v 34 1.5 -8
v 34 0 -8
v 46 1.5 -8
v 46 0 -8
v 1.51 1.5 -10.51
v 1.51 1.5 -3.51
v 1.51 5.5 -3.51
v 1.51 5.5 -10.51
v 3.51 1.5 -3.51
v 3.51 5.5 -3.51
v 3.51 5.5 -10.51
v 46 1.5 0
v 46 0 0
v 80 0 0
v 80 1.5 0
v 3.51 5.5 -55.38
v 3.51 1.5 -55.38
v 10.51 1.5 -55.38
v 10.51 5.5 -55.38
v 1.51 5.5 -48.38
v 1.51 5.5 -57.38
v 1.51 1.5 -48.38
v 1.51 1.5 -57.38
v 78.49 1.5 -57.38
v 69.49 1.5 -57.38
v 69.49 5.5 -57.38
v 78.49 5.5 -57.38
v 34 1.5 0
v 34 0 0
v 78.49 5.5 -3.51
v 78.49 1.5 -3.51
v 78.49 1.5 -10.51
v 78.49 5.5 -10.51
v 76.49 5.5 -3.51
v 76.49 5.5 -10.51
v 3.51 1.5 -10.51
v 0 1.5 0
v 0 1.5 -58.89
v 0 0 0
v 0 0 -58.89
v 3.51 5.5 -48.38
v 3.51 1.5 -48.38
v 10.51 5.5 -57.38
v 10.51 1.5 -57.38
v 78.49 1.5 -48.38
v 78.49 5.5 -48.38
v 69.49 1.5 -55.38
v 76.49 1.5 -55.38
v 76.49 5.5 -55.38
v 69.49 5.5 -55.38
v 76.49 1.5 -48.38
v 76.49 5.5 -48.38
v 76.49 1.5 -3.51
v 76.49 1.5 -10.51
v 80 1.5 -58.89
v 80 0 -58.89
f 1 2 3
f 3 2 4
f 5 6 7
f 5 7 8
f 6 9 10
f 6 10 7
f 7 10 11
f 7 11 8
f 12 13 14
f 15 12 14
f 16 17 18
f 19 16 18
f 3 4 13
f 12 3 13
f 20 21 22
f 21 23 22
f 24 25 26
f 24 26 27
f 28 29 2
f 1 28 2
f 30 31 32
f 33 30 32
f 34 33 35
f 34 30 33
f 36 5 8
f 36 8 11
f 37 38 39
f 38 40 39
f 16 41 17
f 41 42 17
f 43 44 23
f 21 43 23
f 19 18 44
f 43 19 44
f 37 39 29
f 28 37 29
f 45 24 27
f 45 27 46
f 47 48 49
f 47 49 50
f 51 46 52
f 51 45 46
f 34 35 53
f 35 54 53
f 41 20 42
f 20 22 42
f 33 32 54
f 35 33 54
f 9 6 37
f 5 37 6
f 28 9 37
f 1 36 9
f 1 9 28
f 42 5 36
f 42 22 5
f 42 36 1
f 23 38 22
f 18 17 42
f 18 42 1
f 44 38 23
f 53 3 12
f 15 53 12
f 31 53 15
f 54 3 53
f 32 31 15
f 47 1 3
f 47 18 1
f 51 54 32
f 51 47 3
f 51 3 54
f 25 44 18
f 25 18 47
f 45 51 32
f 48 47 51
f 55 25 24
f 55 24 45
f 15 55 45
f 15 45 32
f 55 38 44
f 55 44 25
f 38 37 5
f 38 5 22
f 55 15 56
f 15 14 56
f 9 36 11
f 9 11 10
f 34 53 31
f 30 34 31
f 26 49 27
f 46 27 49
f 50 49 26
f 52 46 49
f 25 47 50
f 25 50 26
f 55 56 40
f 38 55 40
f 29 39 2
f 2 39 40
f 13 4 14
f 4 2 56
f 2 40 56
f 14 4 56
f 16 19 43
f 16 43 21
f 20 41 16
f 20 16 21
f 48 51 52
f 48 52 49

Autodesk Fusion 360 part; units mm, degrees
sketch "Sketch1" plane through (0, 0, 0) normal (0, 1, 0) x (1, 0, 0)
  line L0 (0, 0) -> (80, 0)
  line L1 (80, 0) -> (80, 58.89)
  line L2 (80, 58.89) -> (0, 58.89)
  line L3 (0, 58.89) -> (0, 0)
  line L4 (46, 0) -> (34, 0)
  line L5 (34, 0) -> (34, 8)
  line L6 (34, 8) -> (46, 8)
  line L7 (46, 8) -> (46, 0)
  dimension "d1" = 58.89
  dimension "d2" = 80
  dimension "d11" = 8
  dimension "d14" = 12
  dimension "d15" = 34
extrude "Extrude1" add sketch "Sketch1" along normal blind 1.5
sketch "Sketch2" plane through (0, 1.5, 0) normal (0, 1, 0) x (-1, 0, 0)
  line L0 (0, -58.89) -> (0, 0)
  line L1 (0, 0) -> (-80, 0)
  line L2 (-80, 0) -> (-80, -58.89)
  line L3 (-80, -58.89) -> (0, -58.89)
  line L4 (-10.51, -1.51) -> (-1.51, -1.51)
  line L5 (-1.51, -1.51) -> (-1.51, -10.51)
  line L6 (-1.51, -10.51) -> (-10.51, -10.51)
  line L7 (-10.51, -10.51) -> (-10.51, -1.51)
  line L8 (-10.51, -10.51) -> (-3.51, -10.51)
  line L9 (-3.51, -10.51) -> (-3.51, -3.51)
  line L10 (-3.51, -3.51) -> (-10.51, -3.51)
  line L11 (-10.51, -3.51) -> (-10.51, -10.51)
  line L12 (0, -29.445) -> (-80, -29.445) construction
  line L13 (-3.51, -48.38) -> (-3.51, -55.38)
  line L14 (-3.51, -55.38) -> (-10.51, -55.38)
  line L15 (-10.51, -48.38) -> (-10.51, -57.38)
  line L16 (-1.51, -48.38) -> (-10.51, -48.38)
  line L17 (-1.51, -57.38) -> (-1.51, -48.38)
  line L18 (-10.51, -57.38) -> (-1.51, -57.38)
  line L19 (-69.49, -1.51) -> (-78.49, -1.51)
  line L20 (-76.49, -3.51) -> (-69.49, -3.51)
  line L21 (-78.49, -1.51) -> (-78.49, -10.51)
  line L22 (-76.49, -10.51) -> (-76.49, -3.51)
  line L23 (-78.49, -10.51) -> (-69.49, -10.51)
  line L24 (-69.49, -10.51) -> (-69.49, -1.51)
  line L25 (-78.49, -48.38) -> (-69.49, -48.38)
  line L26 (-69.49, -48.38) -> (-69.49, -57.38)
  line L27 (-76.49, -48.38) -> (-76.49, -55.38)
  line L28 (-78.49, -57.38) -> (-78.49, -48.38)
  line L29 (-76.49, -55.38) -> (-69.49, -55.38)
  line L30 (-69.49, -57.38) -> (-78.49, -57.38)
  line L31 (-3.51, -3.51) -> (-1.51, -3.51)
  line L32 (-76.49, -3.51) -> (-78.49, -3.51)
  dimension "d5" = 9
  dimension "d6" = 9
  dimension "d7" = 1.51
  dimension "d8" = 1.51
extrude "Extrude2" add sketch "Sketch2" along normal blind 4 contours L5 L6 L9 L31 | L13 L14 L15 L16 L17 L18 | L21 L22 L23 L32 | L25 L26 L27 L28 L29 L30
extrude "Extrude3" cut sketch "Sketch1" along normal blind 8.263 contours L0 L4 L5 L6 L7
